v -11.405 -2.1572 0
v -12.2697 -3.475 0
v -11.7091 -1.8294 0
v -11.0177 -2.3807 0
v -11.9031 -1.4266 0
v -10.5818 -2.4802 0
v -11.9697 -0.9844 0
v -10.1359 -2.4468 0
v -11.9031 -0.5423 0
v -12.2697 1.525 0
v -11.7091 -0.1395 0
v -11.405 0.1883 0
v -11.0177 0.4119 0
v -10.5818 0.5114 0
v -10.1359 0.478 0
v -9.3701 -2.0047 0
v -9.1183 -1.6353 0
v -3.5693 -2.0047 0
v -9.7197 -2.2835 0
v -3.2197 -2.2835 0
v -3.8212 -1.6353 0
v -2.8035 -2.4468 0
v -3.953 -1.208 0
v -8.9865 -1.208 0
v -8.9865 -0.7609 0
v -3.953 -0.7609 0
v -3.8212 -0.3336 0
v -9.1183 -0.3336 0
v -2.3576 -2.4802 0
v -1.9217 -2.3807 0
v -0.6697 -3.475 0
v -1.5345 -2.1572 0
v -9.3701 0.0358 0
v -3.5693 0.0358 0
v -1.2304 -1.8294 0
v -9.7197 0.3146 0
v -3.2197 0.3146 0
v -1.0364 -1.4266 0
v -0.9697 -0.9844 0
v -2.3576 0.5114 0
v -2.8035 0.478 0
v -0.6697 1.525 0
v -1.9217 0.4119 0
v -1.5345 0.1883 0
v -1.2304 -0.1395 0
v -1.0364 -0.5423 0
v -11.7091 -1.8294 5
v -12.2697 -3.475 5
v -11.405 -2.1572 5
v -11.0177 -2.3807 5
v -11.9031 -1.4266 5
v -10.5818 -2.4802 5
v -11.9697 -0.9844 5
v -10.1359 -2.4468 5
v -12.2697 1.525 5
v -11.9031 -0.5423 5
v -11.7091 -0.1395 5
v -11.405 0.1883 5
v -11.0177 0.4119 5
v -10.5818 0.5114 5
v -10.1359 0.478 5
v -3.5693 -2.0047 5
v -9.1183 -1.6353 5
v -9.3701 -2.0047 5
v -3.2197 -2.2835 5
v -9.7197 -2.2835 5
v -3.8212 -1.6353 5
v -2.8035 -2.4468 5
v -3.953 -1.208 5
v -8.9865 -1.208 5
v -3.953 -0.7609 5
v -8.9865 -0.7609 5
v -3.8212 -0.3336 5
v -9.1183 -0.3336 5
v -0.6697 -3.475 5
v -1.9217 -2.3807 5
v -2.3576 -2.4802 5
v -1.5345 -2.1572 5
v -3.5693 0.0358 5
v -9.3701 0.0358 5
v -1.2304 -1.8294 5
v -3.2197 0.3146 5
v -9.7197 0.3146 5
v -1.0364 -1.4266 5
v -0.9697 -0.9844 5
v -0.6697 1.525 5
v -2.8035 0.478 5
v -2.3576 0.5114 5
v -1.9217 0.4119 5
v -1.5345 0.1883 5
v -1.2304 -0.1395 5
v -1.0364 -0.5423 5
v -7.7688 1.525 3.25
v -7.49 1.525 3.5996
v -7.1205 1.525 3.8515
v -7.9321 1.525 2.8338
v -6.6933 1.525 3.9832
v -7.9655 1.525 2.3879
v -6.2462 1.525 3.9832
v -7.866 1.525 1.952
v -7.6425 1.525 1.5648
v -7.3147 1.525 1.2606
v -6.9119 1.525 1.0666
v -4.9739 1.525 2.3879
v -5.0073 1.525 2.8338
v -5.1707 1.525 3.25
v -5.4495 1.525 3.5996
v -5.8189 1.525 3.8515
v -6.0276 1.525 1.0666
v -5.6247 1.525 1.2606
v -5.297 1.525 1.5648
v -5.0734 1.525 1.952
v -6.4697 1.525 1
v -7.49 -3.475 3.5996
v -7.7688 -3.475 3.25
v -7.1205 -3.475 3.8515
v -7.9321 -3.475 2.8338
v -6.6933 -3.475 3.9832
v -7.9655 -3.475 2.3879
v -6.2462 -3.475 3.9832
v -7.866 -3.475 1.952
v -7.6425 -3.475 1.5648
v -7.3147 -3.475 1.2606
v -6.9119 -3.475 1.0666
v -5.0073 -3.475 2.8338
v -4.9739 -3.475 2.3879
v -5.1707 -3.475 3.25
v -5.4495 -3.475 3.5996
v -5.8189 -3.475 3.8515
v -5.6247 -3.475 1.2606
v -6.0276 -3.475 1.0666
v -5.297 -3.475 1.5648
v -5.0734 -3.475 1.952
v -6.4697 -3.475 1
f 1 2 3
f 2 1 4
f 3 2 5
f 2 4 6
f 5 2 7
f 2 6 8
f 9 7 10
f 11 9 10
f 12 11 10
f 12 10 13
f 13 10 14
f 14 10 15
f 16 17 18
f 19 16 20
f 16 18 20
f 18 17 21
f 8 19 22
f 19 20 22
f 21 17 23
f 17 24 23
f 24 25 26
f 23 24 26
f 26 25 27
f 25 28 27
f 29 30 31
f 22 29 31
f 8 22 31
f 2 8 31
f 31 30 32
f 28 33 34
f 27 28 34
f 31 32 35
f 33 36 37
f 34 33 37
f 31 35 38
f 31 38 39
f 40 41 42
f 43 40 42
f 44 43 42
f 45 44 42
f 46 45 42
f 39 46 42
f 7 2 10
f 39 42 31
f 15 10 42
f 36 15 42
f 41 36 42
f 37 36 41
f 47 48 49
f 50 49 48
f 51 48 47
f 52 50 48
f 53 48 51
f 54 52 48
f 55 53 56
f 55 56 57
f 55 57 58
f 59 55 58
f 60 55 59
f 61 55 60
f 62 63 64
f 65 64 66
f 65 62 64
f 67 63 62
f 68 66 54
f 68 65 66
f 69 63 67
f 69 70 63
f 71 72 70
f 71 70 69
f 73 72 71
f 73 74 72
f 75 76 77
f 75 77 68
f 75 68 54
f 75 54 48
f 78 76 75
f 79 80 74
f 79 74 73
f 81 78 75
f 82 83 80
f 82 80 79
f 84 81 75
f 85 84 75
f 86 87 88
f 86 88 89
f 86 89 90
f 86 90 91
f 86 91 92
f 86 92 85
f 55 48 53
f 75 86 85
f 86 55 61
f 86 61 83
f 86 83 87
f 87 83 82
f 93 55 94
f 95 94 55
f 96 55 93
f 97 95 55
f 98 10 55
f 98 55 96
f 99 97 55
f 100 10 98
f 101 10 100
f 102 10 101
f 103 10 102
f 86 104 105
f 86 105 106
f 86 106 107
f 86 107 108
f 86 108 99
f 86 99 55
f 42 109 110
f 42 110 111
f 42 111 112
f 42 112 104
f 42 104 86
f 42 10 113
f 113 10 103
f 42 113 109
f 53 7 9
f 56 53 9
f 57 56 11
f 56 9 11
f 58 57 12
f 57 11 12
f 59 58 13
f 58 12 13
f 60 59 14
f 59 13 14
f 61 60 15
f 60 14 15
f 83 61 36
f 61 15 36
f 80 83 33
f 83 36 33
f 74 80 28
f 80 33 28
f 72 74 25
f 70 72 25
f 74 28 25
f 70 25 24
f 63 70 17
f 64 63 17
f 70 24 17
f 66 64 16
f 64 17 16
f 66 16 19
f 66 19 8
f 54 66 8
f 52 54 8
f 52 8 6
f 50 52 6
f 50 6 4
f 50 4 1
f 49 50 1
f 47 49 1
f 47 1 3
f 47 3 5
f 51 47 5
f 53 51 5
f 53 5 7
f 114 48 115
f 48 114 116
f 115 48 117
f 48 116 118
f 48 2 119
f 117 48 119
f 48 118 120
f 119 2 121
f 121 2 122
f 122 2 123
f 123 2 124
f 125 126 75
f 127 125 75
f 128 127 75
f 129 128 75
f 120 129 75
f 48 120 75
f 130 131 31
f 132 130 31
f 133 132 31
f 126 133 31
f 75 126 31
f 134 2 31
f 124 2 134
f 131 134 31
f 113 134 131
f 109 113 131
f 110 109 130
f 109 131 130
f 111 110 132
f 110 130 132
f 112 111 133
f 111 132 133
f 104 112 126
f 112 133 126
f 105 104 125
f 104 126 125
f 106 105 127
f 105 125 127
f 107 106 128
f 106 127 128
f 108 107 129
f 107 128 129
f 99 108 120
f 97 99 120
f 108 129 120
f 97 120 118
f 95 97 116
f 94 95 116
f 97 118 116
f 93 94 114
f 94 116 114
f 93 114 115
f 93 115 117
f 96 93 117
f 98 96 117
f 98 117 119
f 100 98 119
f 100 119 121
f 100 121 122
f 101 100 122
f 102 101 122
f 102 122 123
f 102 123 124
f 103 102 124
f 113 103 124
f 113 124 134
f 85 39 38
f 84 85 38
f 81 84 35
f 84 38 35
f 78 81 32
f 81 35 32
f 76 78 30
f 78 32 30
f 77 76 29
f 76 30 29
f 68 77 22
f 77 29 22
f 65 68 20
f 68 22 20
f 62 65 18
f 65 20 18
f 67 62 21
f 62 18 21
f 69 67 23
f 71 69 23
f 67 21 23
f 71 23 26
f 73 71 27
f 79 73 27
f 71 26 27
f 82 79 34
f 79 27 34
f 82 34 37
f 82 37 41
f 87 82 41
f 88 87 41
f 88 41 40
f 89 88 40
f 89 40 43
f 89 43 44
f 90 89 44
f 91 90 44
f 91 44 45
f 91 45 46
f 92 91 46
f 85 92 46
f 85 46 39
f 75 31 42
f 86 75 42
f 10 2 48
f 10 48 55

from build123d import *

# Parameters (mm, degrees)
SKETCH1_W           = 12
SKETCH1_H           = 5
BOSS_EXTRUDE1_DEPTH = 5
SKETCH2_R           = 1.5
CUT_EXTRUDE1_DEPTH  = 15.335059136
SKETCH3_R           = 1.5
CUT_EXTRUDE2_DEPTH  = 14.87695255
MOVE_FACE1_BY       = 0.2
MOVE_FACE1_2_BY     = 0.2


with BuildPart() as part:
    # Sketch1 → Boss-Extrude1 (new body)
    with BuildSketch(Plane.XY):
        with Locations((-6.469720142, -0.975038364)):
            Rectangle(SKETCH1_W, SKETCH1_H)
    extrude(amount=BOSS_EXTRUDE1_DEPTH)

    # Sketch2 → Cut-Extrude1 (cut, through all)
    with BuildSketch(Plane.XZ.offset(3.475038364)):
        with Locations(Location((-6.469720142, 2.5, 0), (0, 0, 270))):
            Circle(SKETCH2_R)
    extrude(amount=-CUT_EXTRUDE1_DEPTH, mode=Mode.SUBTRACT)

    # Sketch3 → Cut-Extrude2 (cut, through all)
    with BuildSketch(Plane(origin=(0, 0, 0), x_dir=(-1, 0, 0), z_dir=(0, 0, -1))):
        with Locations((10.469720142, -0.98443785)):
            Circle(SKETCH3_R)
        with Locations(Location((2.469720142, -0.98443785, 0), (0, 0, 180))):
            Circle(SKETCH3_R)
    extrude(amount=-CUT_EXTRUDE2_DEPTH, mode=Mode.SUBTRACT)

    # Move Face1: a face moved inward by 0.2
    extrude(part.faces().sort_by_distance((-0.469720142, -0.975038364, 2.5))[0], amount=MOVE_FACE1_BY, dir=(-1, 0, 0), mode=Mode.SUBTRACT)

    # Move Face1 2: a face moved inward by 0.2
    extrude(part.faces().sort_by_distance((-12.469720142, -0.975038364, 2.5))[0], amount=MOVE_FACE1_2_BY, dir=(1, 0, 0), mode=Mode.SUBTRACT)


solid = part.part
